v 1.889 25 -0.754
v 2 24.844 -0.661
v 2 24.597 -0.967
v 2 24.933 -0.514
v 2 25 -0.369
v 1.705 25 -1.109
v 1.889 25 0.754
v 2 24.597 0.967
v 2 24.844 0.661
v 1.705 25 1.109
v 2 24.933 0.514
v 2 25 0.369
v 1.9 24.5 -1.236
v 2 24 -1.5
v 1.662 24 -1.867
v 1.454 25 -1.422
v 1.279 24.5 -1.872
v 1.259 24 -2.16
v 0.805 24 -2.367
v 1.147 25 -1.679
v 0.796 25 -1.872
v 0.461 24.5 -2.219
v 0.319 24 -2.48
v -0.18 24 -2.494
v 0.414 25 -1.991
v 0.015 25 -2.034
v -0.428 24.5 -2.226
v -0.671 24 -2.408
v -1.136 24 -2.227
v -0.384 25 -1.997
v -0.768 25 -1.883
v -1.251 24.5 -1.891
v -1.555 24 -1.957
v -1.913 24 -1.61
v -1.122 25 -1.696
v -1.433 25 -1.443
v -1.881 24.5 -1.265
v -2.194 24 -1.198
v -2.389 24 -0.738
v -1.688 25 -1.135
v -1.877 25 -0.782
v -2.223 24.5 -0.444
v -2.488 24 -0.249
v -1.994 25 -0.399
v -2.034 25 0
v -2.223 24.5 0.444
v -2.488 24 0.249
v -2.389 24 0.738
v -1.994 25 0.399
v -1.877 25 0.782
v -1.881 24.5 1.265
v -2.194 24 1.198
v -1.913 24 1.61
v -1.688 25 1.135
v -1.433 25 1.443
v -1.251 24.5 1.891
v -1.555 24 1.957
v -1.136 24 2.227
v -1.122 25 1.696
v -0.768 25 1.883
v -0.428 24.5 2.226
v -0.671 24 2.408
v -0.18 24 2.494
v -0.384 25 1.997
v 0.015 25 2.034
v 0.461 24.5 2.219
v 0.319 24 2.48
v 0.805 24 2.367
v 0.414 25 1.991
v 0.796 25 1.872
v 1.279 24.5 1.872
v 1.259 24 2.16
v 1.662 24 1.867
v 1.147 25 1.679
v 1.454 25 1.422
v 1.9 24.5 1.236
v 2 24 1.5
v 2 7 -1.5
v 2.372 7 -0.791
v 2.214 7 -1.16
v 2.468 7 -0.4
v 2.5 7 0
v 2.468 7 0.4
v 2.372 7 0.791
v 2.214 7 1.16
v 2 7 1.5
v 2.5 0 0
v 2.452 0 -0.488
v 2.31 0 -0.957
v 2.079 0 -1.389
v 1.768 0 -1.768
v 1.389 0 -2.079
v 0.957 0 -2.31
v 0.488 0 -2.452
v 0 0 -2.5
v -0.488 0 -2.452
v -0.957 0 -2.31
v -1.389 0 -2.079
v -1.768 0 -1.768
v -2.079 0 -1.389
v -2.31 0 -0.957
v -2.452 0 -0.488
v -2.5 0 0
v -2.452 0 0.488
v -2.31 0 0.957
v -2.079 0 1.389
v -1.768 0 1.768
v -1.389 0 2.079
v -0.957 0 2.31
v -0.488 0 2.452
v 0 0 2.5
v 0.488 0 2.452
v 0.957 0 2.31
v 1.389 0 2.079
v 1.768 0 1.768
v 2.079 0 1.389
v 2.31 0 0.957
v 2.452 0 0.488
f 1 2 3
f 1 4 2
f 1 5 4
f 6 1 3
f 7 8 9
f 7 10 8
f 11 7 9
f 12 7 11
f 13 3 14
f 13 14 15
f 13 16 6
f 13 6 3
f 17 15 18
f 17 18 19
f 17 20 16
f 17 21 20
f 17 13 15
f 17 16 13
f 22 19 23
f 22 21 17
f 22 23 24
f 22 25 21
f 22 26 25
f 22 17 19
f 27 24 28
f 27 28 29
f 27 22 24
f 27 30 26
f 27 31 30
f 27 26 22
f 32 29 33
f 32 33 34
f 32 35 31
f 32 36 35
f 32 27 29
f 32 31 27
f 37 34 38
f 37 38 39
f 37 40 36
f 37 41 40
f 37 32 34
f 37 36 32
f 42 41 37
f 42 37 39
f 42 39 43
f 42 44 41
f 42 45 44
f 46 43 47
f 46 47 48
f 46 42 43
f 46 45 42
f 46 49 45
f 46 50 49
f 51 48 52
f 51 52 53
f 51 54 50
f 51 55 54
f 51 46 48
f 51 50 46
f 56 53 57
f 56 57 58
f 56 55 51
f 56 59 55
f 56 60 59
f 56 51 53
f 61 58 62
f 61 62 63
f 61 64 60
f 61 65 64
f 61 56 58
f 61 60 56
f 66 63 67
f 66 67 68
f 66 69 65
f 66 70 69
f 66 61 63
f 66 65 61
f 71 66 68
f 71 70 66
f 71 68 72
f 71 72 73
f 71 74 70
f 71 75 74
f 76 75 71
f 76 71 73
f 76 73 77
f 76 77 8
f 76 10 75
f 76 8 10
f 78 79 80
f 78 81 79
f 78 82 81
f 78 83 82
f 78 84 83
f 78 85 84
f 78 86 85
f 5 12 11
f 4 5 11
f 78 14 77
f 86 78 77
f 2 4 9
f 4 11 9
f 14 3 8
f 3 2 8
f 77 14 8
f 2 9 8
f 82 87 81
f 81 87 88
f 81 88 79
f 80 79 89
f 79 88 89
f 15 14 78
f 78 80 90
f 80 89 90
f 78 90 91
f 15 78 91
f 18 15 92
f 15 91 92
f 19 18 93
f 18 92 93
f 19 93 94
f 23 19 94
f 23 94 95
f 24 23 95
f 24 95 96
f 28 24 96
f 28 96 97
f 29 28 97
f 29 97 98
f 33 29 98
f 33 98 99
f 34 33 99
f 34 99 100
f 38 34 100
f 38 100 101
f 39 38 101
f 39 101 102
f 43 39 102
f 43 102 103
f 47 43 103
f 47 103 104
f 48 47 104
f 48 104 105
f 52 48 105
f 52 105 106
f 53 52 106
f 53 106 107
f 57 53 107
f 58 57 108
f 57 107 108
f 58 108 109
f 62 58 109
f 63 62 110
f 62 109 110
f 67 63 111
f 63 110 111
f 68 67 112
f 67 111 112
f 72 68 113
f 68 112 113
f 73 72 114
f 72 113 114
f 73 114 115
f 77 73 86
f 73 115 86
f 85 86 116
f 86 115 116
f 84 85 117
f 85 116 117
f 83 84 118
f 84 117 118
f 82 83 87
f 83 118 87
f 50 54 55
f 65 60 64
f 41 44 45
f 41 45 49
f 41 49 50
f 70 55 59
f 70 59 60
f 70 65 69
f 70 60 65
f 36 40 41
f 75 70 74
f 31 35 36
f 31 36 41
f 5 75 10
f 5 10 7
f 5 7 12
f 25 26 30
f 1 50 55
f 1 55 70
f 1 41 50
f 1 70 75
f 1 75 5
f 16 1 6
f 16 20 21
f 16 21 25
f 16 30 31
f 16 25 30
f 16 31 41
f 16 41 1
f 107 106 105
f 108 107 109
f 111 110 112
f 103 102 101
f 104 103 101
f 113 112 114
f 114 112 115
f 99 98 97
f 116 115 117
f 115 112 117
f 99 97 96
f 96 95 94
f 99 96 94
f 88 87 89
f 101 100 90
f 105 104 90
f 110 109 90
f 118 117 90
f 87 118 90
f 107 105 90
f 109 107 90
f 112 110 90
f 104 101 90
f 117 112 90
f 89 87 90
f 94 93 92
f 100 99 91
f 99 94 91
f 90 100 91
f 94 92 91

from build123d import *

# Parameters (mm, degrees)
SKETCH_1_R          = 2.5
EXTRUDE_1_DEPTH     = 25
CUT_EXTRUDE_1_DEPTH = 18
CHAMFER_1_SIZE      = 1
CHAMFER_1_SIZE2     = 0.466307658


with BuildPart() as part:
    # 草图1 → 凸台-拉伸1 (new body)
    with BuildSketch(Plane(origin=(0, 0, 0), x_dir=(1, 0, 0), z_dir=(0, 1, 0))):
        Circle(SKETCH_1_R)
    extrude(amount=EXTRUDE_1_DEPTH)

    # 草图2 → 切除-拉伸1 (cut)
    with BuildSketch(Plane(origin=(0, 25, 0), x_dir=(1, 0, 0), z_dir=(0, 1, 0))):
        Polygon((2, 2.598987806), (2, -2.361624848), (2.93708026, -2.012796341), (3.777563327, -1.758131015), (3.87416052, -0.748251275), align=None)
    extrude(amount=-CUT_EXTRUDE_1_DEPTH, mode=Mode.SUBTRACT)

    # 倒角1
    chamfer_1_edges = [part.edges().sort_by_distance(p)[0] for p in [
        (-2.5, 25, 0),
    ]]
    chamfer_1_side = [part.faces().sort_by_distance(p)[0] for p in [
        (-2.5, 12.5, 0),
    ]]
    chamfer(chamfer_1_edges, length=CHAMFER_1_SIZE, length2=CHAMFER_1_SIZE2, reference=chamfer_1_side[0])


solid = part.part
